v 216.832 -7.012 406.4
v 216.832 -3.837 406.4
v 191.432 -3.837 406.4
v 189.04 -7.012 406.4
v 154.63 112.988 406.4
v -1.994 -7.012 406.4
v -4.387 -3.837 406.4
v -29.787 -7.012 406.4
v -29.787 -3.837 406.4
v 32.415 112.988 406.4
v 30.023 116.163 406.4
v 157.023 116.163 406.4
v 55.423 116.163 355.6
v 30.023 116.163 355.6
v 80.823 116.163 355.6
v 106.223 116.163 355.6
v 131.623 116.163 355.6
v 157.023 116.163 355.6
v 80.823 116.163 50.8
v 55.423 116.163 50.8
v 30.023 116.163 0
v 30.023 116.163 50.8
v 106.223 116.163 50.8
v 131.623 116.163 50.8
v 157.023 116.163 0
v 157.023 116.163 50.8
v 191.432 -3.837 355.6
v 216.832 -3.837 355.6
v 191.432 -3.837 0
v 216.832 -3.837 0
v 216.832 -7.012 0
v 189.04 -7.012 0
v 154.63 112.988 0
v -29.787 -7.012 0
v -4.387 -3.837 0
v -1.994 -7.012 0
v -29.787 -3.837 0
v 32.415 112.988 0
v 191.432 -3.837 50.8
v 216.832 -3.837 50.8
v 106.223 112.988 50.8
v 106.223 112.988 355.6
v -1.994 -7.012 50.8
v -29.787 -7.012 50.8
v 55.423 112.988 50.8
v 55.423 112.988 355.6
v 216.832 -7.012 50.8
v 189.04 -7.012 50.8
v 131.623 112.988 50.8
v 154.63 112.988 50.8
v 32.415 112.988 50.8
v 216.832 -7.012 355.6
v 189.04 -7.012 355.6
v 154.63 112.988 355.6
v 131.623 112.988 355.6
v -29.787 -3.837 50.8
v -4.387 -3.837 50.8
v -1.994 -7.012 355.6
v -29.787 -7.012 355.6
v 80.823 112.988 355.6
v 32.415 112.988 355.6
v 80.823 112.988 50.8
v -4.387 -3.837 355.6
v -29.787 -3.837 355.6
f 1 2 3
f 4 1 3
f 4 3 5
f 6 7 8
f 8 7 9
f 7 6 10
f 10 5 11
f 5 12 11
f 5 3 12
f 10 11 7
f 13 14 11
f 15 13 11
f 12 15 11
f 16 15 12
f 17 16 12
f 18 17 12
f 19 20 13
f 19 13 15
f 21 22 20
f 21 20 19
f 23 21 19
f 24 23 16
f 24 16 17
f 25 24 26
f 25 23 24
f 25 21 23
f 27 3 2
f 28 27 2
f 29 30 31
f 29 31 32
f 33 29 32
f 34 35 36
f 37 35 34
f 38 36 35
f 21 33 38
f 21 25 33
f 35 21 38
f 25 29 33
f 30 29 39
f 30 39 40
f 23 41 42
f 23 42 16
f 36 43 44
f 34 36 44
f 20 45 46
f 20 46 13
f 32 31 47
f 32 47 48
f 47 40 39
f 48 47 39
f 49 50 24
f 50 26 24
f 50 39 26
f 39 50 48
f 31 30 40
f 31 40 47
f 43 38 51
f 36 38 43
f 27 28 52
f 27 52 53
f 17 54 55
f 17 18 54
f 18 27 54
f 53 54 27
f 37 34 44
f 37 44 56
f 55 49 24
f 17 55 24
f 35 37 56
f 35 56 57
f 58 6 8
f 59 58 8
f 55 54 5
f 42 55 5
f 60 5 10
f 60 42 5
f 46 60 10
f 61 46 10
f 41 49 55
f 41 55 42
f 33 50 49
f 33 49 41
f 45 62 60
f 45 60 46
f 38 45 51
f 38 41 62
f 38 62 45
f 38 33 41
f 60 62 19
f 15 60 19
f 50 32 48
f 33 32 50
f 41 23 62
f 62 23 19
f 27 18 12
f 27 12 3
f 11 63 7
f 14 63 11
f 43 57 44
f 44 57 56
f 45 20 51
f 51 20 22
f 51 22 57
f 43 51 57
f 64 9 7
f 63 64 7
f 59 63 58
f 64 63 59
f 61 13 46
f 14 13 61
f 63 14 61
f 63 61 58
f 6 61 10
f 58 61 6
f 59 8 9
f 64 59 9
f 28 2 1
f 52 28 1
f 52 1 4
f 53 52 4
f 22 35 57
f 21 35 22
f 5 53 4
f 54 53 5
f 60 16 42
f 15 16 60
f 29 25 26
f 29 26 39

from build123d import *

# Parameters (mm, degrees)
BOSS_EXTRUDE1_DEPTH = 50.8
SKETCH2_W           = 25.4
SKETCH2_H           = 3.175
BOSS_EXTRUDE2_DEPTH = 304.8
BOSS_EXTRUDE4_DEPTH = 50.8


with BuildPart() as part:
    # Sketch1 → Boss-Extrude1 (new body)
    with BuildSketch(Plane.XY):
        Polygon((-29.786832061, -3.837169287), (-4.386832061, -3.837169287), (30.02261423, 116.162830713), (157.02261423, 116.162830713), (191.432060521, -3.837169287), (216.832060521, -3.837169287), (216.832060521, -7.012169287), (189.039526412, -7.012169287), (154.630080121, 112.987830713), (32.415148339, 112.987830713), (-1.994297952, -7.012169287), (-29.786832061, -7.012169287), align=None)
    extrude(amount=BOSS_EXTRUDE1_DEPTH)

    # Sketch2 → Boss-Extrude2 (add)
    with BuildSketch(Plane.XY.offset(50.8)):
        with Locations((68.12261423, 114.575330713)):
            Rectangle(SKETCH2_W, SKETCH2_H)
        with Locations((118.92261423, 114.575330713)):
            Rectangle(SKETCH2_W, SKETCH2_H)
    extrude(amount=BOSS_EXTRUDE2_DEPTH)

    # Sketch4 → Boss-Extrude4 (add)
    with BuildSketch(Plane.XY.offset(355.6)):
        Polygon((30.02261423, 116.162830713), (157.02261423, 116.162830713), (191.432060521, -3.837169287), (216.832060521, -3.837169287), (216.832060521, -7.012169287), (189.039526412, -7.012169287), (154.630080121, 112.987830713), (32.415148339, 112.987830713), (-1.994297952, -7.012169287), (-29.786832061, -7.012169287), (-29.786832061, -3.837169287), (-4.386832061, -3.837169287), align=None)
    extrude(amount=BOSS_EXTRUDE4_DEPTH)


solid = part.part
